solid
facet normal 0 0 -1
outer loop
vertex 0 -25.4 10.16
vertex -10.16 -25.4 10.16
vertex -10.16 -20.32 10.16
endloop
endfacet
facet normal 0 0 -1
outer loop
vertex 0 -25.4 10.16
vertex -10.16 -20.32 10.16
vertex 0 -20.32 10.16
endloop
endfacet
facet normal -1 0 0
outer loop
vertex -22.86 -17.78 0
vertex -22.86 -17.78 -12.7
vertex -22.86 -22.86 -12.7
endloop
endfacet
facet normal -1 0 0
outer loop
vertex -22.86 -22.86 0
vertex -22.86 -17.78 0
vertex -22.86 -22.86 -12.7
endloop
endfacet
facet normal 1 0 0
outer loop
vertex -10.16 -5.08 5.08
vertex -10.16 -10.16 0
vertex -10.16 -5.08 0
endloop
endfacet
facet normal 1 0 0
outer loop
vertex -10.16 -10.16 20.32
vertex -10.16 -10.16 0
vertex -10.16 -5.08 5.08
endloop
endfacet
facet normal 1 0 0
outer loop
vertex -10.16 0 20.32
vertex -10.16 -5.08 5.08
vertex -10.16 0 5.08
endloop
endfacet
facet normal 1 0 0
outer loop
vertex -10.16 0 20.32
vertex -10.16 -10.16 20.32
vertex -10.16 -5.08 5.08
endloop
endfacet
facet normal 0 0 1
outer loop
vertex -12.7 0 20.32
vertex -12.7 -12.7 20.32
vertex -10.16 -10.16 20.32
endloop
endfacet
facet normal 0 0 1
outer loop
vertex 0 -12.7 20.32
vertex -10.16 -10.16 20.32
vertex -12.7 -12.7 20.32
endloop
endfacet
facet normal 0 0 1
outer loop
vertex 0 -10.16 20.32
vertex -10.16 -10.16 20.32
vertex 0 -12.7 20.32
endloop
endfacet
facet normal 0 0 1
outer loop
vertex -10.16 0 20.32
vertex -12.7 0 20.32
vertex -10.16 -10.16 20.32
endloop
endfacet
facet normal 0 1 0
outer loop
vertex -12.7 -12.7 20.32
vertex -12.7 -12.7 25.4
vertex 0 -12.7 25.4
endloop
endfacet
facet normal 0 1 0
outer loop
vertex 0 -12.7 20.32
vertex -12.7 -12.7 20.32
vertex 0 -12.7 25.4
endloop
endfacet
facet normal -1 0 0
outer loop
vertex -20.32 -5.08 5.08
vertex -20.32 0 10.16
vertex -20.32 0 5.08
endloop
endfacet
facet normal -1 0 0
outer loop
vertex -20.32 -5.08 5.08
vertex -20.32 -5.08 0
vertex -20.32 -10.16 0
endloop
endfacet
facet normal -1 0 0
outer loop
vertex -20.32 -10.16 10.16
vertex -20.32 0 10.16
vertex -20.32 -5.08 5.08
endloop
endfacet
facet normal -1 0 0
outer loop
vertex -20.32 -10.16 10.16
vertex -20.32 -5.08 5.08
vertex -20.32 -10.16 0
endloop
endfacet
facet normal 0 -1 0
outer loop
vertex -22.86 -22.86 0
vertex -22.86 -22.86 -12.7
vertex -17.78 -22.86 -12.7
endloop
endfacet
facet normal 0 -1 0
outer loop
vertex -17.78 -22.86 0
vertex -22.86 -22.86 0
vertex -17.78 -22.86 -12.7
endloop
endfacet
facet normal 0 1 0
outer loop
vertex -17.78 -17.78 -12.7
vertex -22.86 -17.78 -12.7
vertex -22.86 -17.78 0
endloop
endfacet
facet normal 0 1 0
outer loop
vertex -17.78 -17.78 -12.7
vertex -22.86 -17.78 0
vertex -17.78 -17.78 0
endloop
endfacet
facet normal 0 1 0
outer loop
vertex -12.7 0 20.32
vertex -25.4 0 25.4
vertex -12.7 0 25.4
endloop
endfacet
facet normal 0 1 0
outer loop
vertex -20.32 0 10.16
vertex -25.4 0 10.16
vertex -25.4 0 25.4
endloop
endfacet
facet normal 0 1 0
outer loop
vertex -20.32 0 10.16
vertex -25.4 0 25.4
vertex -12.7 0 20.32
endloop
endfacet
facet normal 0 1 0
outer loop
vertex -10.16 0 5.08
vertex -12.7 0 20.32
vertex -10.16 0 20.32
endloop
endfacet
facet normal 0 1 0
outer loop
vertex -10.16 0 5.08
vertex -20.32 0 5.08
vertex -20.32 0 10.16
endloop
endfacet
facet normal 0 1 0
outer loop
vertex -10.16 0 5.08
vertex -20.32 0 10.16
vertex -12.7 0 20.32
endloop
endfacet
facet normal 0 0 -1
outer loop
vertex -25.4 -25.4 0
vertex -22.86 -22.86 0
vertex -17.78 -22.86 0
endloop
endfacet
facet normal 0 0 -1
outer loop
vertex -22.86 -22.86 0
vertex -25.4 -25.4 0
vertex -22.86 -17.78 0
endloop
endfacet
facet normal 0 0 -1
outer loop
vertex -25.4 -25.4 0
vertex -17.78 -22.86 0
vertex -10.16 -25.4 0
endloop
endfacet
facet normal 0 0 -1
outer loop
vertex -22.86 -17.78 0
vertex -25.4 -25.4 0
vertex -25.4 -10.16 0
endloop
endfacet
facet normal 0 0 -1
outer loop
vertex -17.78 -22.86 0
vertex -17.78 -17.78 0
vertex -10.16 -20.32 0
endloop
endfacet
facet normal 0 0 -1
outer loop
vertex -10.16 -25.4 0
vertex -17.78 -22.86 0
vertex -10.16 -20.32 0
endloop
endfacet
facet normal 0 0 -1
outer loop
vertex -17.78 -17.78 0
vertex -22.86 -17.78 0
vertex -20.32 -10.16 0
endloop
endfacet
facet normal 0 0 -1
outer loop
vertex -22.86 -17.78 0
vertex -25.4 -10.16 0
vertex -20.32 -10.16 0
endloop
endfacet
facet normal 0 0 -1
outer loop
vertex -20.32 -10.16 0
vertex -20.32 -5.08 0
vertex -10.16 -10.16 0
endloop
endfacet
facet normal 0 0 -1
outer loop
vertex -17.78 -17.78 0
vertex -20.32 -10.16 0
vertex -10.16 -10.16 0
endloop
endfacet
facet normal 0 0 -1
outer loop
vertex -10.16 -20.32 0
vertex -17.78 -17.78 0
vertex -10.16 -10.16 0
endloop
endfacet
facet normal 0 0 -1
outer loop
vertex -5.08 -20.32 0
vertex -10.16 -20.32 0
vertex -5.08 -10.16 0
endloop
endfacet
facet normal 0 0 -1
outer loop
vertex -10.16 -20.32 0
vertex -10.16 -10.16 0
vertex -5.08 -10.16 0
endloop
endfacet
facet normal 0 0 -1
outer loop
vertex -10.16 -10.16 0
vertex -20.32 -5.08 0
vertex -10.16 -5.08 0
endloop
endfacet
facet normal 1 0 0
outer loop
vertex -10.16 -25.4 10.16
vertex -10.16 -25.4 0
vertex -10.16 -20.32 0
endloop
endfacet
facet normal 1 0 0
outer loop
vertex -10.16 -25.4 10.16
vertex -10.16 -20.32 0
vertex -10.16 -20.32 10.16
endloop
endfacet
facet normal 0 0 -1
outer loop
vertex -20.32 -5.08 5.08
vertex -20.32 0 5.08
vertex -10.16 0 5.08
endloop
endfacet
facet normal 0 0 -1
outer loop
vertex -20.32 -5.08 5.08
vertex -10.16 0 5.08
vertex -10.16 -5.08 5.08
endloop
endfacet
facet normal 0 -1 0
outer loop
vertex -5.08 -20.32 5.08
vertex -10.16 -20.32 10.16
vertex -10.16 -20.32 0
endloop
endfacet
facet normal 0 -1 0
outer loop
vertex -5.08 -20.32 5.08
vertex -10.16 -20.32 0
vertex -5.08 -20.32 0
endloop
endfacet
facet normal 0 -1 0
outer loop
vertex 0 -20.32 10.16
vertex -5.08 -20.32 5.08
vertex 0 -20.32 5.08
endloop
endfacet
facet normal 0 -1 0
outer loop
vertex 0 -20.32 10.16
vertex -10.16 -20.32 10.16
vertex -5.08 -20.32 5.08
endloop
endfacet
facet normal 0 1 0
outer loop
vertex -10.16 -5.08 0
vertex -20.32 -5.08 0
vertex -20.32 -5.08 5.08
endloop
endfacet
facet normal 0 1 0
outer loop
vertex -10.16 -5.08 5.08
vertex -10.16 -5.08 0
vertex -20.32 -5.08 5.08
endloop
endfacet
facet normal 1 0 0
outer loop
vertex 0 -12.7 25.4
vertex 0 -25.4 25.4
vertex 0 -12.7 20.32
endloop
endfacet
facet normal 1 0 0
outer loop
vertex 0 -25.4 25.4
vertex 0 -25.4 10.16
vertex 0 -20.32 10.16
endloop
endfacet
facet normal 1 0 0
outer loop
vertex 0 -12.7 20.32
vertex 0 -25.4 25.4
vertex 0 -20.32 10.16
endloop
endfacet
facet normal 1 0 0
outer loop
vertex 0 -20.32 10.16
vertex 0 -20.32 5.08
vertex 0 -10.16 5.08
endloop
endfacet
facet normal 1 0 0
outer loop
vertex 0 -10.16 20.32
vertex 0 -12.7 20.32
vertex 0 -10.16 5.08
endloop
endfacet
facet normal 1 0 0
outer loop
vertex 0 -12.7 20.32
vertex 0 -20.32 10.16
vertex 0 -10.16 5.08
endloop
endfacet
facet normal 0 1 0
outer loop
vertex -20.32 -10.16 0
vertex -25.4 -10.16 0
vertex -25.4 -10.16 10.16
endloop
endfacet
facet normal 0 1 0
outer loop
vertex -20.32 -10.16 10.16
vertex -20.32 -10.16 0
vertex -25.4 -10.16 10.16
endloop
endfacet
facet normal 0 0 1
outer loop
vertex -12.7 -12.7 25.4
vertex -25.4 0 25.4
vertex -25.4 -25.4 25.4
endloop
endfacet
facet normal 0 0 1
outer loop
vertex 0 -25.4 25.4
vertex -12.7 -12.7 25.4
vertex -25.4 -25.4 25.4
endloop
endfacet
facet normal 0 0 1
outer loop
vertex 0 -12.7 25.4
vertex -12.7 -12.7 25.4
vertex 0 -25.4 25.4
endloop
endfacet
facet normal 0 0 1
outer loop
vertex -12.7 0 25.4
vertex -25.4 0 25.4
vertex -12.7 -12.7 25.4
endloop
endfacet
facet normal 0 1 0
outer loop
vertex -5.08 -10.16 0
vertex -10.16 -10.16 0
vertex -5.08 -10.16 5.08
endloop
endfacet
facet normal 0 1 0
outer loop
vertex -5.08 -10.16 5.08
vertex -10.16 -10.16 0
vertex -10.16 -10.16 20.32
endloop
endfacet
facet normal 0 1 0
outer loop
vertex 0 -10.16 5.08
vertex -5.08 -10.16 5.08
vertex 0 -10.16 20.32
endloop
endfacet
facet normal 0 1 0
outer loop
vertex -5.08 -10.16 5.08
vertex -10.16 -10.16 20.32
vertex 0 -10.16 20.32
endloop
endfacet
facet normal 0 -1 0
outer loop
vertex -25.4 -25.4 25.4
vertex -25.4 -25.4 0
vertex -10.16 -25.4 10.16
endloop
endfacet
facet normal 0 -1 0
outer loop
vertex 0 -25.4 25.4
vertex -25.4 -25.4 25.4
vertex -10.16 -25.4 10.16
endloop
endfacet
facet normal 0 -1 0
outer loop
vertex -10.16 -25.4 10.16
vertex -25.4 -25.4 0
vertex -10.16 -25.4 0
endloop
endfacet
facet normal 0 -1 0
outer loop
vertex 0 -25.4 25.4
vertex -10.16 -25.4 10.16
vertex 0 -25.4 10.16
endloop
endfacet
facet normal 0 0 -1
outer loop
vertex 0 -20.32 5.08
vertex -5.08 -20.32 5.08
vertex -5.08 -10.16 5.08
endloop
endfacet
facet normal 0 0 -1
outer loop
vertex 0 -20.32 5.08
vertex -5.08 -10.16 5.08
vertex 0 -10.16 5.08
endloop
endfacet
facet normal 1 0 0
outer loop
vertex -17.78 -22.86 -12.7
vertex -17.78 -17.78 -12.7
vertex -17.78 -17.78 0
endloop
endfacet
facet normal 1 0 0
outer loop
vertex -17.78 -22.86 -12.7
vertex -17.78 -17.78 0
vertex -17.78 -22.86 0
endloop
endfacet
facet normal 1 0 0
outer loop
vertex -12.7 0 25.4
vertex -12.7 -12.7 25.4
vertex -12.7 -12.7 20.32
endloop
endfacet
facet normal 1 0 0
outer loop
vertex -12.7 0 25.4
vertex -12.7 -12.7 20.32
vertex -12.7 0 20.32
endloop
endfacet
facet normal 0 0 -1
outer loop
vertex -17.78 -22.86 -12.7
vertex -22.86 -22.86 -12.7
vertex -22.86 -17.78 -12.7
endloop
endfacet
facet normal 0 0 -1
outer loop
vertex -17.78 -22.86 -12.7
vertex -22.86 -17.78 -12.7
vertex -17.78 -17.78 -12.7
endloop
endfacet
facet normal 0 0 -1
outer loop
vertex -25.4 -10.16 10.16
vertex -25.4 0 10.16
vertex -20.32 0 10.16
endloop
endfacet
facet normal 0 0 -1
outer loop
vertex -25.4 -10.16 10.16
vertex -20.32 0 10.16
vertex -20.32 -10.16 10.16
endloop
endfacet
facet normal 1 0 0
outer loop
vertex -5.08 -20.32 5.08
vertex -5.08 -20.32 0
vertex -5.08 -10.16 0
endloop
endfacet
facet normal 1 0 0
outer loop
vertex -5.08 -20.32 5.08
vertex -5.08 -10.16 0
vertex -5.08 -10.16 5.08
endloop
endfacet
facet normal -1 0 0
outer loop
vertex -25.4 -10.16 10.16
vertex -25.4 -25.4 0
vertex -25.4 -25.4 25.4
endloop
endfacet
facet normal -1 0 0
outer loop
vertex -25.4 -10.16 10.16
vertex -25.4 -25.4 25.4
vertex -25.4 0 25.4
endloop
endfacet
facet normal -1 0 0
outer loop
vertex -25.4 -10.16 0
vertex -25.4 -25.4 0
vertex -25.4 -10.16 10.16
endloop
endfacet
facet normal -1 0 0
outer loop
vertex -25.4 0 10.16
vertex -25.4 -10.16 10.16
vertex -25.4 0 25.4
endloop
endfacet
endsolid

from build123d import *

# Parameters (mm, degrees)
F0_W      = 25.4
F0_H      = 25.4
F1_DEPTH  = 25.4
F2_W      = 10.16
F2_H      = 10.16
F3_DEPTH  = 5.08
F4_W      = 10.16
F4_H      = 10.16
F5_DEPTH  = 25.4
F6_W      = 5.08
F6_H      = 5.08
F7_DEPTH  = 12.7
F8_W      = 10.16
F8_H      = 10.16
F9_DEPTH  = 5.08
F10_W     = 5.08
F10_H     = 5.08
F11_DEPTH = 25.4
F12_W     = 5.08
F12_H     = 5.08
F13_DEPTH = 25.4
F14_W     = 12.7
F14_H     = 12.7
F15_DEPTH = 5.08


with BuildPart() as f1:
    # F0 (on Top) → F1 (new body)
    with BuildSketch(Plane.XY):
        with Locations((-12.7, -12.7)):
            Rectangle(F0_W, F0_H)
    extrude(amount=F1_DEPTH)

    # F2 (on face) → F3 (cut)
    with BuildSketch(Plane(origin=(-25.4, 0, 0), x_dir=(0, -1, 0), z_dir=(-1, 0, 0))):
        with Locations((5.08, 5.08)):
            Rectangle(F2_W, F2_H)
    extrude(amount=-F3_DEPTH, mode=Mode.SUBTRACT)

    # F4 (on face) → F5 (cut)
    with BuildSketch(Plane.XY.offset(25.4)):
        with Locations((-5.08, -5.08)):
            Rectangle(F4_W, F4_H)
    extrude(amount=-F5_DEPTH, mode=Mode.SUBTRACT)

    # F6 (on face) → F7 (join)
    with BuildSketch(Plane(origin=(0, 0, 0), x_dir=(1, 0, 0), z_dir=(0, 0, -1))):
        with Locations((-20.32, 20.32)):
            Rectangle(F6_W, F6_H)
    extrude(amount=F7_DEPTH)

    # F8 (on face) → F9 (cut)
    with BuildSketch(Plane.XZ.offset(25.4)):
        with Locations((-5.08, 5.08)):
            Rectangle(F8_W, F8_H)
    extrude(amount=-F9_DEPTH, mode=Mode.SUBTRACT)

    # F10 (on face) → F11 (cut)
    with BuildSketch(Plane.XZ.offset(20.32)):
        with Locations((-2.54, 2.54)):
            Rectangle(F10_W, F10_H)
    extrude(amount=-F11_DEPTH, mode=Mode.SUBTRACT)

    # F12 (on face) → F13 (cut)
    with BuildSketch(Plane(origin=(-20.32, 0, 0), x_dir=(0, -1, 0), z_dir=(-1, 0, 0))):
        with Locations((2.54, 2.54)):
            Rectangle(F12_W, F12_H)
    extrude(amount=-F13_DEPTH, mode=Mode.SUBTRACT)

    # F14 (on face) → F15 (cut)
    with BuildSketch(Plane.XY.offset(25.4)):
        with Locations((-6.35, -6.35)):
            Rectangle(F14_W, F14_H)
    extrude(amount=-F15_DEPTH, mode=Mode.SUBTRACT)


solid = f1.part
